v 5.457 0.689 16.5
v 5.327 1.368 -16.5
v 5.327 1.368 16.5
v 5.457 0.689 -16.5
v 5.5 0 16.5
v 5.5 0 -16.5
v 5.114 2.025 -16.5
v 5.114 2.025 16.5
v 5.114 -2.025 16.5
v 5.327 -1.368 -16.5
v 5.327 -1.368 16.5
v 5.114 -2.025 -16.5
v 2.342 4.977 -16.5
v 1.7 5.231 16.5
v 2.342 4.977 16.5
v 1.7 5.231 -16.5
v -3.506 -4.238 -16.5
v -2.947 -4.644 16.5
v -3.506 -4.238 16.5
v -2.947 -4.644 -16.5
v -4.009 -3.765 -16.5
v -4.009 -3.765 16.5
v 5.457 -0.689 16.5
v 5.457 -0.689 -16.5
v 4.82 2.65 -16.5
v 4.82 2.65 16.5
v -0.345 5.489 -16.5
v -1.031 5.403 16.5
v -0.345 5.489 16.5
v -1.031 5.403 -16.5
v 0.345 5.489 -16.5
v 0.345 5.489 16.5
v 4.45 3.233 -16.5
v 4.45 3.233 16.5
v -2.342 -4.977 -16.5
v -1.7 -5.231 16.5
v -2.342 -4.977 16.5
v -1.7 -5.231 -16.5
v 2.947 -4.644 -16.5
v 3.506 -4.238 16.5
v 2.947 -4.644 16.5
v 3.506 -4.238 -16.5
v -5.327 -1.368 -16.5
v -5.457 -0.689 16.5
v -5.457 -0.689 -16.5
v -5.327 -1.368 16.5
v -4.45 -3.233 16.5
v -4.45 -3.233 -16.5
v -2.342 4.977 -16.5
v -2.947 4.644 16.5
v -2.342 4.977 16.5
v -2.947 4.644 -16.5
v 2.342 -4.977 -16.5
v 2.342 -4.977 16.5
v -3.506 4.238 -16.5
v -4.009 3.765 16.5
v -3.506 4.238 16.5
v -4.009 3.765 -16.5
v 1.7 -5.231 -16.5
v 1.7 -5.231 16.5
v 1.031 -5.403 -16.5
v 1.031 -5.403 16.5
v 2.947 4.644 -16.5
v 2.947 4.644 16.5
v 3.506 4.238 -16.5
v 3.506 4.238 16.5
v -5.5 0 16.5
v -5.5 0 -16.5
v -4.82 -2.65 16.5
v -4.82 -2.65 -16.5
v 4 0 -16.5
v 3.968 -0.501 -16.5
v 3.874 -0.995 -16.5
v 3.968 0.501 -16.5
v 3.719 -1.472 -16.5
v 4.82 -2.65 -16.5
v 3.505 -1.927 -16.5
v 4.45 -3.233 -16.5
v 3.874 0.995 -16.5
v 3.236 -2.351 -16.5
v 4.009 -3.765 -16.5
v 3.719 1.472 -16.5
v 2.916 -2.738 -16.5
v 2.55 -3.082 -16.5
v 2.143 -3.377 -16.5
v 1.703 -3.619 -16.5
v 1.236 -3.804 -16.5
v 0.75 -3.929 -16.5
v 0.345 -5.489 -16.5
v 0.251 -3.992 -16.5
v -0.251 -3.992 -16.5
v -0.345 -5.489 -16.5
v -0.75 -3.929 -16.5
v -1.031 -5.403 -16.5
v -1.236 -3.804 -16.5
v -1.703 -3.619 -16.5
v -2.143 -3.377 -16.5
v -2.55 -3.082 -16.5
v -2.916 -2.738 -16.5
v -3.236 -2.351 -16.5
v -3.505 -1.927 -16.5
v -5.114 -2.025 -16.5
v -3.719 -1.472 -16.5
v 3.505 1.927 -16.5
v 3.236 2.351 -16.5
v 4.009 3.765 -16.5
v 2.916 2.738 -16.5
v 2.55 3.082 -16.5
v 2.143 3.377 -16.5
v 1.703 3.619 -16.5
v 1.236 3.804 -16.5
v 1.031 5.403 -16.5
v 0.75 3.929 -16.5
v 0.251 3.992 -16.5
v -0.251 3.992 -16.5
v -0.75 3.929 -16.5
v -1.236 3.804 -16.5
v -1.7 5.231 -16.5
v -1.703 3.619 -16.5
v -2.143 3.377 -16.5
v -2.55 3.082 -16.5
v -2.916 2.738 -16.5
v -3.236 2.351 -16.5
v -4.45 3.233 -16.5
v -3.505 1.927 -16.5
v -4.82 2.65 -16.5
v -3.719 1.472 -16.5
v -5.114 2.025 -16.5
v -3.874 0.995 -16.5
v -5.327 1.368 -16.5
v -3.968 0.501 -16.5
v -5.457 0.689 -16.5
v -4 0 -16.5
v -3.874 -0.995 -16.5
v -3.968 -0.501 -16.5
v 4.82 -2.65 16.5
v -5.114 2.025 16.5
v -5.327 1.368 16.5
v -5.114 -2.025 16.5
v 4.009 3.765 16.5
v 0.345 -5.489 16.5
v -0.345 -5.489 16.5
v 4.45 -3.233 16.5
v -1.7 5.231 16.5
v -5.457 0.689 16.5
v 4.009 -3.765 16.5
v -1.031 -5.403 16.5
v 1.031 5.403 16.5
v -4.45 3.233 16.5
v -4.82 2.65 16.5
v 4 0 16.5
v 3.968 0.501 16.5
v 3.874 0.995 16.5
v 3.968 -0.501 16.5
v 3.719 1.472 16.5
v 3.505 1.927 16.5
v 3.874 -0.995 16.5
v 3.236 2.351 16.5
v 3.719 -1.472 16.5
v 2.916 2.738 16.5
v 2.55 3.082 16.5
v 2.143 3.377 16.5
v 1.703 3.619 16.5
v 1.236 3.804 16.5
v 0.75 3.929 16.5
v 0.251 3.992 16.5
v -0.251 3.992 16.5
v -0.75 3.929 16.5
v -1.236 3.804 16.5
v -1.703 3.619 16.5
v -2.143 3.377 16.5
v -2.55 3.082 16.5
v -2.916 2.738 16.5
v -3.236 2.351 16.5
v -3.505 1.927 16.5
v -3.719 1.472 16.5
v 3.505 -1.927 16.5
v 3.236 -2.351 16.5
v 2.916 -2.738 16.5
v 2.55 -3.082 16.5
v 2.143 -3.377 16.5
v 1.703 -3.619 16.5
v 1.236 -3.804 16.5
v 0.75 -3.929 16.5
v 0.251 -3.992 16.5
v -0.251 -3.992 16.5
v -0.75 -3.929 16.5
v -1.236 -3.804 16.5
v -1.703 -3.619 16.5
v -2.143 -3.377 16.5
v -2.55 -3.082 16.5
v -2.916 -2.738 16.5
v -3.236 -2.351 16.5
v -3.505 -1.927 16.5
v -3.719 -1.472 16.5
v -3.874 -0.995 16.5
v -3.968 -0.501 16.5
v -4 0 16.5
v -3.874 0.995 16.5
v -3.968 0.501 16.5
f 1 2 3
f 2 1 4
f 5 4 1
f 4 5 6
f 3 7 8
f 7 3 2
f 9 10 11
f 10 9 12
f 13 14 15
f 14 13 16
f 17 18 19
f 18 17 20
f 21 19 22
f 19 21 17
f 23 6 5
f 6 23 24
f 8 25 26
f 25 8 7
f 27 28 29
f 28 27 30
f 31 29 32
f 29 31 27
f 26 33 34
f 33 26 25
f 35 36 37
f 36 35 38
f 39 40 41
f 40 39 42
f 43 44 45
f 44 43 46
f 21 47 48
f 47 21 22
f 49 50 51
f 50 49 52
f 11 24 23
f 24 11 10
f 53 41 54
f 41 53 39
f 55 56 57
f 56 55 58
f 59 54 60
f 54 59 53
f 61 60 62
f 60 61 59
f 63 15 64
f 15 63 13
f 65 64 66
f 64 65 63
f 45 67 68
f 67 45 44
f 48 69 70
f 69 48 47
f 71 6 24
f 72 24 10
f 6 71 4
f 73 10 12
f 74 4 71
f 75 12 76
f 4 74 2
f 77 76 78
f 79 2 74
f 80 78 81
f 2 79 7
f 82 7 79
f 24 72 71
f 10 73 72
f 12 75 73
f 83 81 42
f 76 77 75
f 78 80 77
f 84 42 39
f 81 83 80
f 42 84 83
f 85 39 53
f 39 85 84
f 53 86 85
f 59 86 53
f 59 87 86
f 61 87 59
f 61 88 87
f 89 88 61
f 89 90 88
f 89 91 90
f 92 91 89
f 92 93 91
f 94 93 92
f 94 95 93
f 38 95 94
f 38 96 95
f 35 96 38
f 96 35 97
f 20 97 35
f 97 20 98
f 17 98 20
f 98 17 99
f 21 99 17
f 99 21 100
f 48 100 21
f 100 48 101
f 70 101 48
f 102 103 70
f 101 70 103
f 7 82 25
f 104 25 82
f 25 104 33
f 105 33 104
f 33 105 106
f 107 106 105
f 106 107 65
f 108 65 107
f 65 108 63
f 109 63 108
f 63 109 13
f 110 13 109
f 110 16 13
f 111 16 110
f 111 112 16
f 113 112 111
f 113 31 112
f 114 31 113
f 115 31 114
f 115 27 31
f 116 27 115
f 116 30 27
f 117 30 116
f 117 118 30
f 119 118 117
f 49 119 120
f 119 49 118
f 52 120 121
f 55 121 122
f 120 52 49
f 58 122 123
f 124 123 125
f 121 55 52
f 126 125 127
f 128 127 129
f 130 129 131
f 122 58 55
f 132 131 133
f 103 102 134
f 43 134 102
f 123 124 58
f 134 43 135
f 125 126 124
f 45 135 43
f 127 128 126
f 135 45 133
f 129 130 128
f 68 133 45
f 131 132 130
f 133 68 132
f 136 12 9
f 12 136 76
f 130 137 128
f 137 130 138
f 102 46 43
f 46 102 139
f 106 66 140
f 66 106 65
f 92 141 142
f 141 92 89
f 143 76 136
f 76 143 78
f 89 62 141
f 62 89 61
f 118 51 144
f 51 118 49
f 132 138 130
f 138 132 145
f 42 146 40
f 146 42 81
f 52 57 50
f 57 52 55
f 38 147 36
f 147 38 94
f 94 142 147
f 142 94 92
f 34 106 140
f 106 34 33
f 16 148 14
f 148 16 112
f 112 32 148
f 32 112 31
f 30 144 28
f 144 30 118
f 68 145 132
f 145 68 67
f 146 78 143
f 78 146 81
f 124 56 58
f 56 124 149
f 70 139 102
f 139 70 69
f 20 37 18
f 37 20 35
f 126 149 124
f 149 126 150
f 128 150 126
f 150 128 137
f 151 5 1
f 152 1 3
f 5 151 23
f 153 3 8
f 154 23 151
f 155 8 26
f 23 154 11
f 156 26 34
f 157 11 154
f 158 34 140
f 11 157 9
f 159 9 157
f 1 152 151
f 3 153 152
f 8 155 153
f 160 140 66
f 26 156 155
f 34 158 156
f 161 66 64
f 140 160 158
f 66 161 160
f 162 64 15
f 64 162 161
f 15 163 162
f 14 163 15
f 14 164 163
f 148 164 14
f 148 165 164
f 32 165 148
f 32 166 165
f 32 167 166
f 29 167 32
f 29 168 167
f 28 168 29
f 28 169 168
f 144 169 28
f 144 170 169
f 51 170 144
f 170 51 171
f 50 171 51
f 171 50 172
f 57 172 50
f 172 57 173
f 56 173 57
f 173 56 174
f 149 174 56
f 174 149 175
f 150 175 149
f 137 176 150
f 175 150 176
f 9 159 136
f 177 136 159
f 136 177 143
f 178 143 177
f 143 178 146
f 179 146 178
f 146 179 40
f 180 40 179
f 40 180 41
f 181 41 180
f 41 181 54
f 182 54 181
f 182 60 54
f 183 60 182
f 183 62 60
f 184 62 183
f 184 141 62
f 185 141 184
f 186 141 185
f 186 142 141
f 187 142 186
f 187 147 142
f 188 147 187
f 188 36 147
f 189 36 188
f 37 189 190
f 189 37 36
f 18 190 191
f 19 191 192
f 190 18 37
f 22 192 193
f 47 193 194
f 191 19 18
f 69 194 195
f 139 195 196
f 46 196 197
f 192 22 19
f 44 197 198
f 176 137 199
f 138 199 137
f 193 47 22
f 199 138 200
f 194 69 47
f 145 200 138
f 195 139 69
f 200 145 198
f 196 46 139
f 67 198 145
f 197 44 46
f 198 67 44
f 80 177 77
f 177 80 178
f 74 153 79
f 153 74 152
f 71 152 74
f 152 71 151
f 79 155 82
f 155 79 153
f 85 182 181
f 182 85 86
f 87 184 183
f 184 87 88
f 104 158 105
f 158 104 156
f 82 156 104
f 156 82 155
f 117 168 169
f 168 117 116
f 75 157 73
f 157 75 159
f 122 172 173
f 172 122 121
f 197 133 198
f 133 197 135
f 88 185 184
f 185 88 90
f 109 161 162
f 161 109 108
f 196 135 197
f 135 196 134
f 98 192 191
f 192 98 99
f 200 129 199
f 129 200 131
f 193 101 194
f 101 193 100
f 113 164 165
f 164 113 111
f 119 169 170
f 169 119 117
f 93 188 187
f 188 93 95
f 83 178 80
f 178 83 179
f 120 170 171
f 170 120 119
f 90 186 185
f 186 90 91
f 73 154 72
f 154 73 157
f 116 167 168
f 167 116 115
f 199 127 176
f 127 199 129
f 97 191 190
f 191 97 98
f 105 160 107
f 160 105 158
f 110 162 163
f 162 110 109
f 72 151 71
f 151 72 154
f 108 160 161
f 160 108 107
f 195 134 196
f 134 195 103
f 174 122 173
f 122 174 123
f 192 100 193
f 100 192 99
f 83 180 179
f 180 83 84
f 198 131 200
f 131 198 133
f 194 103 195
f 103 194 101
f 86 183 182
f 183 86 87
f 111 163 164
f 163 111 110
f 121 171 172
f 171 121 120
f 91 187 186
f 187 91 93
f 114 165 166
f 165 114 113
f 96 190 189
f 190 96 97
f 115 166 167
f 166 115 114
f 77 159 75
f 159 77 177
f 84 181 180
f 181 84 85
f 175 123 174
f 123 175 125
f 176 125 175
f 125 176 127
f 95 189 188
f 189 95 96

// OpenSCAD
$fn = 50;


difference() {
	union() {
		translate(v = [0, 0, -16.5000000000]) {
			cylinder(h = 33, r = 5.5000000000);
		}
	}
	union() {
		translate(v = [0, 0, -100.0000000000]) {
			cylinder(h = 200, r = 4.0000000000);
		}
	}
}
